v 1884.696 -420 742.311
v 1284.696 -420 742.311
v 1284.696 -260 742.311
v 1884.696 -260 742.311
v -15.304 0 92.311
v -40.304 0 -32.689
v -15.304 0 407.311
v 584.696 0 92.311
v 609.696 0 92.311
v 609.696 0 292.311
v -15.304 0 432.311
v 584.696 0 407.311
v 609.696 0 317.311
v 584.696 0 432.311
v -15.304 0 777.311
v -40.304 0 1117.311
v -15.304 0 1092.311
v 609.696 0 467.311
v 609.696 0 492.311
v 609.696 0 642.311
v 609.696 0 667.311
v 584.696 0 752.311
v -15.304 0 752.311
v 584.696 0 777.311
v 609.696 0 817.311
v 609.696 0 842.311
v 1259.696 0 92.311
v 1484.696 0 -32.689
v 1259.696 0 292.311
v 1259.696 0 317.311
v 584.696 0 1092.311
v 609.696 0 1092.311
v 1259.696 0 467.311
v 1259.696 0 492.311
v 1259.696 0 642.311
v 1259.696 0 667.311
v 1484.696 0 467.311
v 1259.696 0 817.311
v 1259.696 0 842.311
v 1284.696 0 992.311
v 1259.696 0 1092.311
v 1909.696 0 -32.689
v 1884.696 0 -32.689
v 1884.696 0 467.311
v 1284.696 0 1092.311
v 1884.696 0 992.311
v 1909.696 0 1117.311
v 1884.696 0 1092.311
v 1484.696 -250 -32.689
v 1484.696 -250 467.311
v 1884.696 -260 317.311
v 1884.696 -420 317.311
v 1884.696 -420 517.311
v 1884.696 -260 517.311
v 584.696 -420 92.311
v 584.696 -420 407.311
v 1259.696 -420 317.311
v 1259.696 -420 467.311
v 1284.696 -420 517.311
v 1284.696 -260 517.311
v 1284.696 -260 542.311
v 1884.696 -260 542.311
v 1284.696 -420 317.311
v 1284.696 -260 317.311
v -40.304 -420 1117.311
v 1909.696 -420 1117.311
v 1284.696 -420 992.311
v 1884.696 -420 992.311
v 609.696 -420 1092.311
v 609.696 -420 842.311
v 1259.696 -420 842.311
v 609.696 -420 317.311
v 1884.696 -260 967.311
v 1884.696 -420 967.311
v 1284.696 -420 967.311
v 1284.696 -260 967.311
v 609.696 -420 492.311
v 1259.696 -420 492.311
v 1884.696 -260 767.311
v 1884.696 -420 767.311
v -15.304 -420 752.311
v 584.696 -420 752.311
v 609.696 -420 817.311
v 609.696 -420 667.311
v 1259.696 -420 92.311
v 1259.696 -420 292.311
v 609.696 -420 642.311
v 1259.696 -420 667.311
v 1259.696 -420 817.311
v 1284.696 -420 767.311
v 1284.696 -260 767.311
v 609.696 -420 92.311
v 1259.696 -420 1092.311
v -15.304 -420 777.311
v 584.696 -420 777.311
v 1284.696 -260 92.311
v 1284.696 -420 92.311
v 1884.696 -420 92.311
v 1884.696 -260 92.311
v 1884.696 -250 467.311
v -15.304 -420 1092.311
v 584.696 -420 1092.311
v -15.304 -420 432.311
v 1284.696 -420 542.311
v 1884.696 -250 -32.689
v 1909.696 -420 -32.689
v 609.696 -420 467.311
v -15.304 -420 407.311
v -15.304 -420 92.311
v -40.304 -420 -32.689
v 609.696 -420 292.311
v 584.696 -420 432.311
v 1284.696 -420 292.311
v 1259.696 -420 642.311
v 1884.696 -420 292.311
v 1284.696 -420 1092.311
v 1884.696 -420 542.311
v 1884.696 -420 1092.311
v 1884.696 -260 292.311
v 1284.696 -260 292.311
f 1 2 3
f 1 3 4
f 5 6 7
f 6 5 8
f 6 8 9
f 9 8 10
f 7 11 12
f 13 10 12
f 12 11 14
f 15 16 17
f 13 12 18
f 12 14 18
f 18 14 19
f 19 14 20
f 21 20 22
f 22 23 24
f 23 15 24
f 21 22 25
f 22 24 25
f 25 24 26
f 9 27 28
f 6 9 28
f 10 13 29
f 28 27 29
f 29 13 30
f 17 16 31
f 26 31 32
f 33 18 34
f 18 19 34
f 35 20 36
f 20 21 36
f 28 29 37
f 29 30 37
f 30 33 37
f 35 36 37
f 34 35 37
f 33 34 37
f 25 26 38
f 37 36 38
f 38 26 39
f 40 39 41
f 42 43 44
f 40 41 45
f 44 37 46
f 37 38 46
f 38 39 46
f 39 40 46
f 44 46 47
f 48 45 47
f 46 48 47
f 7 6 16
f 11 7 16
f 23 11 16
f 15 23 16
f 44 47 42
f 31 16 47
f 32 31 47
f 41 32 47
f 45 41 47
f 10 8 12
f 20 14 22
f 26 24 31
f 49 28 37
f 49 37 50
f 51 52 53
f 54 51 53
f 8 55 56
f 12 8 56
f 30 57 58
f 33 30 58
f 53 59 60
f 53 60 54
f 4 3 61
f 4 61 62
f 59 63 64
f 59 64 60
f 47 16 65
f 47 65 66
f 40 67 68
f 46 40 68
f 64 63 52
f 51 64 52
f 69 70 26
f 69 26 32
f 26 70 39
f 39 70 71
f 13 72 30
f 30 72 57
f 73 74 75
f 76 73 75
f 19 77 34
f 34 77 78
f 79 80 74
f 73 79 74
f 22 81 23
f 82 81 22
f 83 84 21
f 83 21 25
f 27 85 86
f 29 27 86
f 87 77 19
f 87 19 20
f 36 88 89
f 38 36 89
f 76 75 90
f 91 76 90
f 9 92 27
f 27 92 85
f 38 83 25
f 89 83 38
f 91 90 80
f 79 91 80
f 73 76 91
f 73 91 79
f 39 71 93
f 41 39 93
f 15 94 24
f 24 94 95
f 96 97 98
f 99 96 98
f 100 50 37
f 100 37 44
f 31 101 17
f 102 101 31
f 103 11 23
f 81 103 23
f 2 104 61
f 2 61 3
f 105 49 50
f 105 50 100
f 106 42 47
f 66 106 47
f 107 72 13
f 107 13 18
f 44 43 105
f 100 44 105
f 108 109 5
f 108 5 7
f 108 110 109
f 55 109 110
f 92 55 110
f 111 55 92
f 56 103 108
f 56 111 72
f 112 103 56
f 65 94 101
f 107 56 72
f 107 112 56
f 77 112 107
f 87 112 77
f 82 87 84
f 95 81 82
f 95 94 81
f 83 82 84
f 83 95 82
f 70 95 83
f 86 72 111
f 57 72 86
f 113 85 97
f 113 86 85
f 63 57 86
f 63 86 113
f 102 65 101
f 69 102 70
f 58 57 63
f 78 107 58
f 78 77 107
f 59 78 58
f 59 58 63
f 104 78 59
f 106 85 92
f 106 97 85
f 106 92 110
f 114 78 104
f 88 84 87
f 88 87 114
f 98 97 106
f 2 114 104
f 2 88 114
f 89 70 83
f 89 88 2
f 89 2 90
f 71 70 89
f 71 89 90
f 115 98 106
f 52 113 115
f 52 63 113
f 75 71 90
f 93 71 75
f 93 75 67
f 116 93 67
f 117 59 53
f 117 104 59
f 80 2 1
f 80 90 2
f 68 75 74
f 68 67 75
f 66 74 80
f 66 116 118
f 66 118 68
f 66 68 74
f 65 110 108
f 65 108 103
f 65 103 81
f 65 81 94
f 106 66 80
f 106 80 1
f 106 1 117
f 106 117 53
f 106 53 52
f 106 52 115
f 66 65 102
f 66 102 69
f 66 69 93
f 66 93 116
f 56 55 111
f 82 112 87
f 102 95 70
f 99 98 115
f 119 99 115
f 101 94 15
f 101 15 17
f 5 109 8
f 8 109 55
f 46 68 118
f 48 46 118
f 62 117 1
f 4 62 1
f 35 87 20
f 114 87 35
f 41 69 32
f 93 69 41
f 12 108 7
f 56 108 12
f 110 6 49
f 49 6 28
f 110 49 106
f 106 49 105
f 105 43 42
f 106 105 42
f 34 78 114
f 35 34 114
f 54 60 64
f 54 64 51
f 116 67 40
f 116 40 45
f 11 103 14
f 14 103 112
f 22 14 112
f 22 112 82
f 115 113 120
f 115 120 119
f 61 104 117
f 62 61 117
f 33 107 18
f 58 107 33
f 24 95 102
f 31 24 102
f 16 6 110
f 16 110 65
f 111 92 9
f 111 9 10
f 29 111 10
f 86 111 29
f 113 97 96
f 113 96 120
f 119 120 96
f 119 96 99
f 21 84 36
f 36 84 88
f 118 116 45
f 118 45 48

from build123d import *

# Parameters (mm, degrees)
F0_W     = 1950
F0_H     = 1150
F1_DEPTH = 420
F2_W     = 650
F2_H     = 200
F2_H_2   = 150
F2_H_3   = 250
F2_W_2   = 600
F2_H_4   = 315
F2_H_5   = 320
F3_DEPTH = 450
F4_W     = 600
F4_H     = 200
F5_DEPTH = 160
F6_W     = 600
F6_H     = 100
F7_DEPTH = 450
F8_W     = 400
F8_H     = 250
F9_DEPTH = 500


with BuildPart() as f1:
    # F0 (on Front) → F1 (new body)
    with BuildSketch(Plane.XZ):
        with Locations((934.696341, 542.311319)):
            Rectangle(F0_W, F0_H)
    extrude(amount=F1_DEPTH)

    # F2 (on face) → F3 (cut)
    with BuildSketch(Plane.XZ.offset(420)):
        with Locations((934.696341, 192.311319)):
            Rectangle(F2_W, F2_H)
        with Locations((934.696341, 392.311319)):
            Rectangle(F2_W, F2_H_2)
        with Locations((934.696341, 567.311319)):
            Rectangle(F2_W, F2_H_2)
        with Locations((934.696341, 742.311319)):
            Rectangle(F2_W, F2_H_2)
        with Locations((934.696341, 967.311319)):
            Rectangle(F2_W, F2_H_3)
        with Locations((284.696341, 934.811319)):
            Rectangle(F2_W_2, F2_H_4)
        with Locations((284.696341, 592.311319)):
            Rectangle(F2_W_2, F2_H_5)
        with Locations((284.696341, 249.811319)):
            Rectangle(F2_W_2, F2_H_4)
    extrude(amount=-F3_DEPTH, mode=Mode.SUBTRACT)

    # F4 (on face) → F5 (cut)
    with BuildSketch(Plane.XZ.offset(420)):
        Polygon((1884.696341, 967.311319), (1284.696341, 967.311319), (1284.696341, 842.311319), (1284.696341, 817.311319), (1284.696341, 767.311319), (1884.696341, 767.311319), (1884.696341, 817.311319), (1884.696341, 842.311319), align=None)
        with Locations((1584.696341, 642.311319)):
            Rectangle(F4_W, F4_H)
        with Locations((1584.696341, 417.311319)):
            Rectangle(F4_W, F4_H)
        with Locations((1584.696341, 192.311319)):
            Rectangle(F4_W, F4_H)
    extrude(amount=-F5_DEPTH, mode=Mode.SUBTRACT)

    # F6 (on face) → F7 (cut)
    with BuildSketch(Plane.XZ.offset(420)):
        with Locations((1584.696341, 1042.311319)):
            Rectangle(F6_W, F6_H)
    extrude(amount=-F7_DEPTH, mode=Mode.SUBTRACT)

    # F8 (on face) → F9 (cut)
    with BuildSketch(Plane(origin=(0, 0, -32.688681), x_dir=(1, 0, 0), z_dir=(0, 0, -1))):
        with Locations((1684.696341, 125)):
            Rectangle(F8_W, F8_H)
    extrude(amount=-F9_DEPTH, mode=Mode.SUBTRACT)


solid = f1.part
